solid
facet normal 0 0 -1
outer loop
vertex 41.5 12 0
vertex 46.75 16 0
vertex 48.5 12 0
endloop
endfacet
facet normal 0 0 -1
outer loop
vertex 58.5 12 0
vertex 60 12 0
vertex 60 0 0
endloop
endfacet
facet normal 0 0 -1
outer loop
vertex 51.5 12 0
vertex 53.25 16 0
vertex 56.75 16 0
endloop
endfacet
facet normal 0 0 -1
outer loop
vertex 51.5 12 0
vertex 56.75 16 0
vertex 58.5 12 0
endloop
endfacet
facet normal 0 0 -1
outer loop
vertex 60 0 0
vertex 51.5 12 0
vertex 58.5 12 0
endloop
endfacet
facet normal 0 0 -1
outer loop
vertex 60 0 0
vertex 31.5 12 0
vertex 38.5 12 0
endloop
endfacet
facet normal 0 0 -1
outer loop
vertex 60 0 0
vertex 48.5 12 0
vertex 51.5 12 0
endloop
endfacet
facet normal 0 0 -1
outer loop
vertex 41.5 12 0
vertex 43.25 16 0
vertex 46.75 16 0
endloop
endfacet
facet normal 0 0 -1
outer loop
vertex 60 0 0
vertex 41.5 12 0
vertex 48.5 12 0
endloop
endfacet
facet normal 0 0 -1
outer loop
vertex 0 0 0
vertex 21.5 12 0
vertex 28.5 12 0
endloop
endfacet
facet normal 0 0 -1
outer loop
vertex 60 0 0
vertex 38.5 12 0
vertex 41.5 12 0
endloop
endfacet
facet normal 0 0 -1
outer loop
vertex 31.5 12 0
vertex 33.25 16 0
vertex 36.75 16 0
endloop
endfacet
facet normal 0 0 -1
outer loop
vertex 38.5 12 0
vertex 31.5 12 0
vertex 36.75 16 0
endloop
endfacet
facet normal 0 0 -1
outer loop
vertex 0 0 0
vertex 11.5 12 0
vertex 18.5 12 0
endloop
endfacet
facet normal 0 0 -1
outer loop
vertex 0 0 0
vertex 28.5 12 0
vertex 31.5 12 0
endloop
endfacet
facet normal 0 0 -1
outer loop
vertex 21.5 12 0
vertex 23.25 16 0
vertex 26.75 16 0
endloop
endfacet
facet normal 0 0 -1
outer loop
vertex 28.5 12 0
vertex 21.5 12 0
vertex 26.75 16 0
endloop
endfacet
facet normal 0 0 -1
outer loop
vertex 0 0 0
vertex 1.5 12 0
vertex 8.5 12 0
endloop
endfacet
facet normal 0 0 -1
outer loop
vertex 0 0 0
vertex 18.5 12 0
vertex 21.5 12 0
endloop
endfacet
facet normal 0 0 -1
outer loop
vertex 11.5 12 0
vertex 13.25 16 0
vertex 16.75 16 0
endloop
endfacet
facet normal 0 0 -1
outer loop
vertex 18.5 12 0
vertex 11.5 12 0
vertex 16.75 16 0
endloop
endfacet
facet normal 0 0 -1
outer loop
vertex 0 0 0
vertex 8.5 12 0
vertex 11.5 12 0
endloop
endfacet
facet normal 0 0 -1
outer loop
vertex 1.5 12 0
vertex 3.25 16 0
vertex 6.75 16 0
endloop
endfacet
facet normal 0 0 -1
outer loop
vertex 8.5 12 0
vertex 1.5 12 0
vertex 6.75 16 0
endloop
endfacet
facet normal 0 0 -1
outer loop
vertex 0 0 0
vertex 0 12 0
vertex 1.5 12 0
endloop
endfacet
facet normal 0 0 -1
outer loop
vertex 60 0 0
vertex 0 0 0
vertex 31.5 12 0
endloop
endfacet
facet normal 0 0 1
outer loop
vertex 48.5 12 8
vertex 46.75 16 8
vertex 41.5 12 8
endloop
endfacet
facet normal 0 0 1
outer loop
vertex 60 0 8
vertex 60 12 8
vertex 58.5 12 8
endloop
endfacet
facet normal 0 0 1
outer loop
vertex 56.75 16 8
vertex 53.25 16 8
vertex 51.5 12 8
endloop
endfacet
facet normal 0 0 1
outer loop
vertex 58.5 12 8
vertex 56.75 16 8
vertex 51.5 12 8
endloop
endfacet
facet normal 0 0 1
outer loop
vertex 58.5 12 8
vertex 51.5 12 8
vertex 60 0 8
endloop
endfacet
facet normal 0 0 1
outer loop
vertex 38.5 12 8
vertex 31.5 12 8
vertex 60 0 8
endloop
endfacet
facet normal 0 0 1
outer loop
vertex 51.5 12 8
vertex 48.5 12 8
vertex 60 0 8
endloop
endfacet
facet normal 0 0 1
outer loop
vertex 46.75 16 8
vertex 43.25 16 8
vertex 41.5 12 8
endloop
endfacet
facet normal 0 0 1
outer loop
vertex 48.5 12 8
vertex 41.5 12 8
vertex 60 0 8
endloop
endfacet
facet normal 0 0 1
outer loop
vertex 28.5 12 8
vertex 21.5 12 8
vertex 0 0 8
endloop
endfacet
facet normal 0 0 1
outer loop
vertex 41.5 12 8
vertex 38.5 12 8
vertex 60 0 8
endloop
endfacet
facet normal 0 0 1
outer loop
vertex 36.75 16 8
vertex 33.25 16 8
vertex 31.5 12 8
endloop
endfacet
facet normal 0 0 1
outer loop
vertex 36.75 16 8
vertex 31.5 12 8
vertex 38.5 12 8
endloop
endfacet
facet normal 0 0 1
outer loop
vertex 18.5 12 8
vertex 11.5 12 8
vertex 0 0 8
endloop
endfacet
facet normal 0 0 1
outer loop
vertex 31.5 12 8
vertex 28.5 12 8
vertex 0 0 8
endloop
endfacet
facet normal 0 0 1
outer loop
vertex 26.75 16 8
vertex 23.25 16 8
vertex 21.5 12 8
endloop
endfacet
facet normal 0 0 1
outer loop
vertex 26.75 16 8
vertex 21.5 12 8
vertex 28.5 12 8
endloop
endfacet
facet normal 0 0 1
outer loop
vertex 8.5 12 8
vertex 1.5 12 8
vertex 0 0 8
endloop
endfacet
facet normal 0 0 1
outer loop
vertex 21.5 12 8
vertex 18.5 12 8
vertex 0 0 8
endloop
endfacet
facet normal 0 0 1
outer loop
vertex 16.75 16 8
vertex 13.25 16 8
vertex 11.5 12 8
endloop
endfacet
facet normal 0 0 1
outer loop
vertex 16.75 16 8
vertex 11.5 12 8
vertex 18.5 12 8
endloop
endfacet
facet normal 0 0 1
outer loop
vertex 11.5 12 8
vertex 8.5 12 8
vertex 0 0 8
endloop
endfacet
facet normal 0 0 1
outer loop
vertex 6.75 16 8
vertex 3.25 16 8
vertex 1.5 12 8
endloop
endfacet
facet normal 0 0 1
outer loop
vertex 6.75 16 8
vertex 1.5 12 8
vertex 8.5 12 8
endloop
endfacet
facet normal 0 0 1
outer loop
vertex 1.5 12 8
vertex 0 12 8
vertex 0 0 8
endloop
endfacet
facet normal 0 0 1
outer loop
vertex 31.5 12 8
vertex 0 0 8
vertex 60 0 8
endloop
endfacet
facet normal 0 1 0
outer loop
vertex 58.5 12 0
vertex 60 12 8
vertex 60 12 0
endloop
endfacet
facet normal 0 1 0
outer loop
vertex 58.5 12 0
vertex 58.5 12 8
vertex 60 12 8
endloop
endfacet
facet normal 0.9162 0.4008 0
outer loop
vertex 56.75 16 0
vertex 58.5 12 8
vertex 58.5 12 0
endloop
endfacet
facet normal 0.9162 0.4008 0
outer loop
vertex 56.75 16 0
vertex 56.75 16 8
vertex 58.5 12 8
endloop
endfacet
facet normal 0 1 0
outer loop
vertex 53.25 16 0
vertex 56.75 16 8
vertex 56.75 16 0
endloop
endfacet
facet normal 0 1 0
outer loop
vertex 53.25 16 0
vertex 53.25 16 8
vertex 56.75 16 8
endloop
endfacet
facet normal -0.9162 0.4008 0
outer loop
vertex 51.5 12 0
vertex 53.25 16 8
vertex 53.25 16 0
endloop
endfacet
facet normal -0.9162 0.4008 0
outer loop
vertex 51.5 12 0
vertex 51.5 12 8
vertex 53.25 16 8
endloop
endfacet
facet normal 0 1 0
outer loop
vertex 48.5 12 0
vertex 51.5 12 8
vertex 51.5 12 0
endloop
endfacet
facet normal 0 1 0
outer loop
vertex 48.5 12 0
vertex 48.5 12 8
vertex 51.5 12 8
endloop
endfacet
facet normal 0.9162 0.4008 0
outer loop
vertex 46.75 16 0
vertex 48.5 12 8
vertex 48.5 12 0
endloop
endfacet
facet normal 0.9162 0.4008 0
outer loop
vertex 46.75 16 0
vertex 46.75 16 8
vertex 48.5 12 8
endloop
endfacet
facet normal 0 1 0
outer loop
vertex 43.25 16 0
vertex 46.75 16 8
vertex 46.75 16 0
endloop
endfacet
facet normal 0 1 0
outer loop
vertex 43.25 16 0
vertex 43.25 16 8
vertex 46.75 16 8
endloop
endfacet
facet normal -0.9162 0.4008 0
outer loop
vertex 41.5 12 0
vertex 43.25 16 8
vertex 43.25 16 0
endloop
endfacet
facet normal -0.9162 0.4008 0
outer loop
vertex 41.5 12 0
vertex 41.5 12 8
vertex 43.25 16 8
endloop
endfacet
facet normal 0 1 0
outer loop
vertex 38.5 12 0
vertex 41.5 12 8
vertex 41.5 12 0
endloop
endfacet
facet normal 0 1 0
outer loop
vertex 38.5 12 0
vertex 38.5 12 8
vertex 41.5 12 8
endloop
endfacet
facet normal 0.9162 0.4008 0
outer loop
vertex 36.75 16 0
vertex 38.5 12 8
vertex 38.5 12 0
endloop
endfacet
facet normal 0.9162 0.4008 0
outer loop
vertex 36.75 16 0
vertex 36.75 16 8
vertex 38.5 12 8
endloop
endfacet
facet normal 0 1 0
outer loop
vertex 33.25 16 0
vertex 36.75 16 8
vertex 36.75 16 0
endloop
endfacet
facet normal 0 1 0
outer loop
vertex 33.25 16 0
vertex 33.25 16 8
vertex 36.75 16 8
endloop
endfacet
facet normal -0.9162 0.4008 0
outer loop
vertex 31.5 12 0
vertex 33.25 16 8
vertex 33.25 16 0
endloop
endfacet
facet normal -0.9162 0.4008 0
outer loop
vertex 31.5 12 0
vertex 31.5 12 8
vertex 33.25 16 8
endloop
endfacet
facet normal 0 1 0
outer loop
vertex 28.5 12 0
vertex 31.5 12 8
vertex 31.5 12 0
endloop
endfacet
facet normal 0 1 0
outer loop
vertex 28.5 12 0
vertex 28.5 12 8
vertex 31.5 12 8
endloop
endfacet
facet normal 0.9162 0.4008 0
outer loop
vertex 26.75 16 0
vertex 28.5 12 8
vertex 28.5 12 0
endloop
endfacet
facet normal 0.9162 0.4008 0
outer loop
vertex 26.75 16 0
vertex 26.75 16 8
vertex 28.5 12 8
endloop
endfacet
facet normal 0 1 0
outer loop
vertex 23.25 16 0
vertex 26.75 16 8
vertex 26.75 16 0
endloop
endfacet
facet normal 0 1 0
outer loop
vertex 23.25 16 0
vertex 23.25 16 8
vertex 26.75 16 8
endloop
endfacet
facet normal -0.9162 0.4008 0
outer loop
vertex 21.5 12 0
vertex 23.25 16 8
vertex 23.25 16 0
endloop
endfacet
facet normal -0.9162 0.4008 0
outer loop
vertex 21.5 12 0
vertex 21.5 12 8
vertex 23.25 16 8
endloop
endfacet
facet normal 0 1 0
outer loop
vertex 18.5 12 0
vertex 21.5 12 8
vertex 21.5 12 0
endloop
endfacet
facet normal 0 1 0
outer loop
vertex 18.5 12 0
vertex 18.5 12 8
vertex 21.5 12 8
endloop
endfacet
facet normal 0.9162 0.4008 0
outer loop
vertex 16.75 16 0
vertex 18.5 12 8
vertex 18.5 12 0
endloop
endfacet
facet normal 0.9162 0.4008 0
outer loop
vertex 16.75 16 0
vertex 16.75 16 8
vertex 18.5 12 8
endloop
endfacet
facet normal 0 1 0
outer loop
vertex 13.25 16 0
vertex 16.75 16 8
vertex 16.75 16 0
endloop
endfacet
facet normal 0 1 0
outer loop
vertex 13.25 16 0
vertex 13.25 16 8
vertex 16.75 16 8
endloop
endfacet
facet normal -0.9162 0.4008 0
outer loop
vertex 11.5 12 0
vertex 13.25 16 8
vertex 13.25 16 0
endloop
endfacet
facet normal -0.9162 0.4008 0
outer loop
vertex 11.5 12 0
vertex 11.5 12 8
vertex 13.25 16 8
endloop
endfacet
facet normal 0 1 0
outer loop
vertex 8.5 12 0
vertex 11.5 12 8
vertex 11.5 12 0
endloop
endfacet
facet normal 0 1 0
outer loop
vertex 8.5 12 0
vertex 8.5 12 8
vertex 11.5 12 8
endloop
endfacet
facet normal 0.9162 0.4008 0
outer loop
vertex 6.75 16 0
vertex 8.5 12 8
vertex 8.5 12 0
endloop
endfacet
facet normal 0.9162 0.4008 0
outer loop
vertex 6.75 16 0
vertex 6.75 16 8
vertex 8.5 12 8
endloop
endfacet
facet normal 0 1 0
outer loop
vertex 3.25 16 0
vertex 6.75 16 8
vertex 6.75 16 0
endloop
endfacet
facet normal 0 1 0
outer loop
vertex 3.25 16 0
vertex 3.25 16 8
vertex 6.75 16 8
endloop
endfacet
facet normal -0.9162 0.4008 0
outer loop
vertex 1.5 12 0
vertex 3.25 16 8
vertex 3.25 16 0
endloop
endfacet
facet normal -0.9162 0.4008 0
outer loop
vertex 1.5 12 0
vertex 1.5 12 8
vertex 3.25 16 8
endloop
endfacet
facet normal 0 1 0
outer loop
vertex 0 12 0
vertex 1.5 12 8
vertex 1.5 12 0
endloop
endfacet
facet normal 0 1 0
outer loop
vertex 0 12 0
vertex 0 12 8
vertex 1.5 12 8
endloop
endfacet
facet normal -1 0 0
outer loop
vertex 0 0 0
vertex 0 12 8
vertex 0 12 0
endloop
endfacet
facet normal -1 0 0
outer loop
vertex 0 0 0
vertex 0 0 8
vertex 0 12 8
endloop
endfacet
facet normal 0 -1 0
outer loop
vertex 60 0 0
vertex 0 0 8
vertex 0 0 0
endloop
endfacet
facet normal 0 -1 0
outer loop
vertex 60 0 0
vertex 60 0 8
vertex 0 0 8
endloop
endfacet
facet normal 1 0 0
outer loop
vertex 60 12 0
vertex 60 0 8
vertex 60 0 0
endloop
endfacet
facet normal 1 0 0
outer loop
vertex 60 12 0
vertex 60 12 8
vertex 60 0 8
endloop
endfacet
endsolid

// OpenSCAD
$fn = 32;

// ----------------------------------------------------------------------
// Gear rack: 6 teeth, pitch 10 mm
// ----------------------------------------------------------------------

// --- parameters (mm) ---
teeth = 6;                // number of teeth
pitch = 10;               // tooth pitch, X
root_w = 7;               // tooth width at the root
tip_w = 3.5;              // tooth width at the tip
base_h = 12;              // rack body height, Y
tooth_h = 4;              // tooth height above the body
plate_t = 8;              // rack width, Z (extrusion height)

rack_l = teeth * pitch;  // overall length
total_h = base_h + tooth_h;  // overall height

profile = [[0, 0], [60, 0], [60, 12], [58.5, 12], [56.75, 16], [53.25, 16], [51.5, 12], [48.5, 12], [46.75, 16], [43.25, 16], [41.5, 12], [38.5, 12], [36.75, 16], [33.25, 16], [31.5, 12], [28.5, 12], [26.75, 16], [23.25, 16], [21.5, 12], [18.5, 12], [16.75, 16], [13.25, 16], [11.5, 12], [8.5, 12], [6.75, 16], [3.25, 16], [1.5, 12], [0, 12]];  // primary outline, 28 points, counter clockwise

// --- the one profile operation ---
linear_extrude(height = plate_t) polygon(points = profile);
